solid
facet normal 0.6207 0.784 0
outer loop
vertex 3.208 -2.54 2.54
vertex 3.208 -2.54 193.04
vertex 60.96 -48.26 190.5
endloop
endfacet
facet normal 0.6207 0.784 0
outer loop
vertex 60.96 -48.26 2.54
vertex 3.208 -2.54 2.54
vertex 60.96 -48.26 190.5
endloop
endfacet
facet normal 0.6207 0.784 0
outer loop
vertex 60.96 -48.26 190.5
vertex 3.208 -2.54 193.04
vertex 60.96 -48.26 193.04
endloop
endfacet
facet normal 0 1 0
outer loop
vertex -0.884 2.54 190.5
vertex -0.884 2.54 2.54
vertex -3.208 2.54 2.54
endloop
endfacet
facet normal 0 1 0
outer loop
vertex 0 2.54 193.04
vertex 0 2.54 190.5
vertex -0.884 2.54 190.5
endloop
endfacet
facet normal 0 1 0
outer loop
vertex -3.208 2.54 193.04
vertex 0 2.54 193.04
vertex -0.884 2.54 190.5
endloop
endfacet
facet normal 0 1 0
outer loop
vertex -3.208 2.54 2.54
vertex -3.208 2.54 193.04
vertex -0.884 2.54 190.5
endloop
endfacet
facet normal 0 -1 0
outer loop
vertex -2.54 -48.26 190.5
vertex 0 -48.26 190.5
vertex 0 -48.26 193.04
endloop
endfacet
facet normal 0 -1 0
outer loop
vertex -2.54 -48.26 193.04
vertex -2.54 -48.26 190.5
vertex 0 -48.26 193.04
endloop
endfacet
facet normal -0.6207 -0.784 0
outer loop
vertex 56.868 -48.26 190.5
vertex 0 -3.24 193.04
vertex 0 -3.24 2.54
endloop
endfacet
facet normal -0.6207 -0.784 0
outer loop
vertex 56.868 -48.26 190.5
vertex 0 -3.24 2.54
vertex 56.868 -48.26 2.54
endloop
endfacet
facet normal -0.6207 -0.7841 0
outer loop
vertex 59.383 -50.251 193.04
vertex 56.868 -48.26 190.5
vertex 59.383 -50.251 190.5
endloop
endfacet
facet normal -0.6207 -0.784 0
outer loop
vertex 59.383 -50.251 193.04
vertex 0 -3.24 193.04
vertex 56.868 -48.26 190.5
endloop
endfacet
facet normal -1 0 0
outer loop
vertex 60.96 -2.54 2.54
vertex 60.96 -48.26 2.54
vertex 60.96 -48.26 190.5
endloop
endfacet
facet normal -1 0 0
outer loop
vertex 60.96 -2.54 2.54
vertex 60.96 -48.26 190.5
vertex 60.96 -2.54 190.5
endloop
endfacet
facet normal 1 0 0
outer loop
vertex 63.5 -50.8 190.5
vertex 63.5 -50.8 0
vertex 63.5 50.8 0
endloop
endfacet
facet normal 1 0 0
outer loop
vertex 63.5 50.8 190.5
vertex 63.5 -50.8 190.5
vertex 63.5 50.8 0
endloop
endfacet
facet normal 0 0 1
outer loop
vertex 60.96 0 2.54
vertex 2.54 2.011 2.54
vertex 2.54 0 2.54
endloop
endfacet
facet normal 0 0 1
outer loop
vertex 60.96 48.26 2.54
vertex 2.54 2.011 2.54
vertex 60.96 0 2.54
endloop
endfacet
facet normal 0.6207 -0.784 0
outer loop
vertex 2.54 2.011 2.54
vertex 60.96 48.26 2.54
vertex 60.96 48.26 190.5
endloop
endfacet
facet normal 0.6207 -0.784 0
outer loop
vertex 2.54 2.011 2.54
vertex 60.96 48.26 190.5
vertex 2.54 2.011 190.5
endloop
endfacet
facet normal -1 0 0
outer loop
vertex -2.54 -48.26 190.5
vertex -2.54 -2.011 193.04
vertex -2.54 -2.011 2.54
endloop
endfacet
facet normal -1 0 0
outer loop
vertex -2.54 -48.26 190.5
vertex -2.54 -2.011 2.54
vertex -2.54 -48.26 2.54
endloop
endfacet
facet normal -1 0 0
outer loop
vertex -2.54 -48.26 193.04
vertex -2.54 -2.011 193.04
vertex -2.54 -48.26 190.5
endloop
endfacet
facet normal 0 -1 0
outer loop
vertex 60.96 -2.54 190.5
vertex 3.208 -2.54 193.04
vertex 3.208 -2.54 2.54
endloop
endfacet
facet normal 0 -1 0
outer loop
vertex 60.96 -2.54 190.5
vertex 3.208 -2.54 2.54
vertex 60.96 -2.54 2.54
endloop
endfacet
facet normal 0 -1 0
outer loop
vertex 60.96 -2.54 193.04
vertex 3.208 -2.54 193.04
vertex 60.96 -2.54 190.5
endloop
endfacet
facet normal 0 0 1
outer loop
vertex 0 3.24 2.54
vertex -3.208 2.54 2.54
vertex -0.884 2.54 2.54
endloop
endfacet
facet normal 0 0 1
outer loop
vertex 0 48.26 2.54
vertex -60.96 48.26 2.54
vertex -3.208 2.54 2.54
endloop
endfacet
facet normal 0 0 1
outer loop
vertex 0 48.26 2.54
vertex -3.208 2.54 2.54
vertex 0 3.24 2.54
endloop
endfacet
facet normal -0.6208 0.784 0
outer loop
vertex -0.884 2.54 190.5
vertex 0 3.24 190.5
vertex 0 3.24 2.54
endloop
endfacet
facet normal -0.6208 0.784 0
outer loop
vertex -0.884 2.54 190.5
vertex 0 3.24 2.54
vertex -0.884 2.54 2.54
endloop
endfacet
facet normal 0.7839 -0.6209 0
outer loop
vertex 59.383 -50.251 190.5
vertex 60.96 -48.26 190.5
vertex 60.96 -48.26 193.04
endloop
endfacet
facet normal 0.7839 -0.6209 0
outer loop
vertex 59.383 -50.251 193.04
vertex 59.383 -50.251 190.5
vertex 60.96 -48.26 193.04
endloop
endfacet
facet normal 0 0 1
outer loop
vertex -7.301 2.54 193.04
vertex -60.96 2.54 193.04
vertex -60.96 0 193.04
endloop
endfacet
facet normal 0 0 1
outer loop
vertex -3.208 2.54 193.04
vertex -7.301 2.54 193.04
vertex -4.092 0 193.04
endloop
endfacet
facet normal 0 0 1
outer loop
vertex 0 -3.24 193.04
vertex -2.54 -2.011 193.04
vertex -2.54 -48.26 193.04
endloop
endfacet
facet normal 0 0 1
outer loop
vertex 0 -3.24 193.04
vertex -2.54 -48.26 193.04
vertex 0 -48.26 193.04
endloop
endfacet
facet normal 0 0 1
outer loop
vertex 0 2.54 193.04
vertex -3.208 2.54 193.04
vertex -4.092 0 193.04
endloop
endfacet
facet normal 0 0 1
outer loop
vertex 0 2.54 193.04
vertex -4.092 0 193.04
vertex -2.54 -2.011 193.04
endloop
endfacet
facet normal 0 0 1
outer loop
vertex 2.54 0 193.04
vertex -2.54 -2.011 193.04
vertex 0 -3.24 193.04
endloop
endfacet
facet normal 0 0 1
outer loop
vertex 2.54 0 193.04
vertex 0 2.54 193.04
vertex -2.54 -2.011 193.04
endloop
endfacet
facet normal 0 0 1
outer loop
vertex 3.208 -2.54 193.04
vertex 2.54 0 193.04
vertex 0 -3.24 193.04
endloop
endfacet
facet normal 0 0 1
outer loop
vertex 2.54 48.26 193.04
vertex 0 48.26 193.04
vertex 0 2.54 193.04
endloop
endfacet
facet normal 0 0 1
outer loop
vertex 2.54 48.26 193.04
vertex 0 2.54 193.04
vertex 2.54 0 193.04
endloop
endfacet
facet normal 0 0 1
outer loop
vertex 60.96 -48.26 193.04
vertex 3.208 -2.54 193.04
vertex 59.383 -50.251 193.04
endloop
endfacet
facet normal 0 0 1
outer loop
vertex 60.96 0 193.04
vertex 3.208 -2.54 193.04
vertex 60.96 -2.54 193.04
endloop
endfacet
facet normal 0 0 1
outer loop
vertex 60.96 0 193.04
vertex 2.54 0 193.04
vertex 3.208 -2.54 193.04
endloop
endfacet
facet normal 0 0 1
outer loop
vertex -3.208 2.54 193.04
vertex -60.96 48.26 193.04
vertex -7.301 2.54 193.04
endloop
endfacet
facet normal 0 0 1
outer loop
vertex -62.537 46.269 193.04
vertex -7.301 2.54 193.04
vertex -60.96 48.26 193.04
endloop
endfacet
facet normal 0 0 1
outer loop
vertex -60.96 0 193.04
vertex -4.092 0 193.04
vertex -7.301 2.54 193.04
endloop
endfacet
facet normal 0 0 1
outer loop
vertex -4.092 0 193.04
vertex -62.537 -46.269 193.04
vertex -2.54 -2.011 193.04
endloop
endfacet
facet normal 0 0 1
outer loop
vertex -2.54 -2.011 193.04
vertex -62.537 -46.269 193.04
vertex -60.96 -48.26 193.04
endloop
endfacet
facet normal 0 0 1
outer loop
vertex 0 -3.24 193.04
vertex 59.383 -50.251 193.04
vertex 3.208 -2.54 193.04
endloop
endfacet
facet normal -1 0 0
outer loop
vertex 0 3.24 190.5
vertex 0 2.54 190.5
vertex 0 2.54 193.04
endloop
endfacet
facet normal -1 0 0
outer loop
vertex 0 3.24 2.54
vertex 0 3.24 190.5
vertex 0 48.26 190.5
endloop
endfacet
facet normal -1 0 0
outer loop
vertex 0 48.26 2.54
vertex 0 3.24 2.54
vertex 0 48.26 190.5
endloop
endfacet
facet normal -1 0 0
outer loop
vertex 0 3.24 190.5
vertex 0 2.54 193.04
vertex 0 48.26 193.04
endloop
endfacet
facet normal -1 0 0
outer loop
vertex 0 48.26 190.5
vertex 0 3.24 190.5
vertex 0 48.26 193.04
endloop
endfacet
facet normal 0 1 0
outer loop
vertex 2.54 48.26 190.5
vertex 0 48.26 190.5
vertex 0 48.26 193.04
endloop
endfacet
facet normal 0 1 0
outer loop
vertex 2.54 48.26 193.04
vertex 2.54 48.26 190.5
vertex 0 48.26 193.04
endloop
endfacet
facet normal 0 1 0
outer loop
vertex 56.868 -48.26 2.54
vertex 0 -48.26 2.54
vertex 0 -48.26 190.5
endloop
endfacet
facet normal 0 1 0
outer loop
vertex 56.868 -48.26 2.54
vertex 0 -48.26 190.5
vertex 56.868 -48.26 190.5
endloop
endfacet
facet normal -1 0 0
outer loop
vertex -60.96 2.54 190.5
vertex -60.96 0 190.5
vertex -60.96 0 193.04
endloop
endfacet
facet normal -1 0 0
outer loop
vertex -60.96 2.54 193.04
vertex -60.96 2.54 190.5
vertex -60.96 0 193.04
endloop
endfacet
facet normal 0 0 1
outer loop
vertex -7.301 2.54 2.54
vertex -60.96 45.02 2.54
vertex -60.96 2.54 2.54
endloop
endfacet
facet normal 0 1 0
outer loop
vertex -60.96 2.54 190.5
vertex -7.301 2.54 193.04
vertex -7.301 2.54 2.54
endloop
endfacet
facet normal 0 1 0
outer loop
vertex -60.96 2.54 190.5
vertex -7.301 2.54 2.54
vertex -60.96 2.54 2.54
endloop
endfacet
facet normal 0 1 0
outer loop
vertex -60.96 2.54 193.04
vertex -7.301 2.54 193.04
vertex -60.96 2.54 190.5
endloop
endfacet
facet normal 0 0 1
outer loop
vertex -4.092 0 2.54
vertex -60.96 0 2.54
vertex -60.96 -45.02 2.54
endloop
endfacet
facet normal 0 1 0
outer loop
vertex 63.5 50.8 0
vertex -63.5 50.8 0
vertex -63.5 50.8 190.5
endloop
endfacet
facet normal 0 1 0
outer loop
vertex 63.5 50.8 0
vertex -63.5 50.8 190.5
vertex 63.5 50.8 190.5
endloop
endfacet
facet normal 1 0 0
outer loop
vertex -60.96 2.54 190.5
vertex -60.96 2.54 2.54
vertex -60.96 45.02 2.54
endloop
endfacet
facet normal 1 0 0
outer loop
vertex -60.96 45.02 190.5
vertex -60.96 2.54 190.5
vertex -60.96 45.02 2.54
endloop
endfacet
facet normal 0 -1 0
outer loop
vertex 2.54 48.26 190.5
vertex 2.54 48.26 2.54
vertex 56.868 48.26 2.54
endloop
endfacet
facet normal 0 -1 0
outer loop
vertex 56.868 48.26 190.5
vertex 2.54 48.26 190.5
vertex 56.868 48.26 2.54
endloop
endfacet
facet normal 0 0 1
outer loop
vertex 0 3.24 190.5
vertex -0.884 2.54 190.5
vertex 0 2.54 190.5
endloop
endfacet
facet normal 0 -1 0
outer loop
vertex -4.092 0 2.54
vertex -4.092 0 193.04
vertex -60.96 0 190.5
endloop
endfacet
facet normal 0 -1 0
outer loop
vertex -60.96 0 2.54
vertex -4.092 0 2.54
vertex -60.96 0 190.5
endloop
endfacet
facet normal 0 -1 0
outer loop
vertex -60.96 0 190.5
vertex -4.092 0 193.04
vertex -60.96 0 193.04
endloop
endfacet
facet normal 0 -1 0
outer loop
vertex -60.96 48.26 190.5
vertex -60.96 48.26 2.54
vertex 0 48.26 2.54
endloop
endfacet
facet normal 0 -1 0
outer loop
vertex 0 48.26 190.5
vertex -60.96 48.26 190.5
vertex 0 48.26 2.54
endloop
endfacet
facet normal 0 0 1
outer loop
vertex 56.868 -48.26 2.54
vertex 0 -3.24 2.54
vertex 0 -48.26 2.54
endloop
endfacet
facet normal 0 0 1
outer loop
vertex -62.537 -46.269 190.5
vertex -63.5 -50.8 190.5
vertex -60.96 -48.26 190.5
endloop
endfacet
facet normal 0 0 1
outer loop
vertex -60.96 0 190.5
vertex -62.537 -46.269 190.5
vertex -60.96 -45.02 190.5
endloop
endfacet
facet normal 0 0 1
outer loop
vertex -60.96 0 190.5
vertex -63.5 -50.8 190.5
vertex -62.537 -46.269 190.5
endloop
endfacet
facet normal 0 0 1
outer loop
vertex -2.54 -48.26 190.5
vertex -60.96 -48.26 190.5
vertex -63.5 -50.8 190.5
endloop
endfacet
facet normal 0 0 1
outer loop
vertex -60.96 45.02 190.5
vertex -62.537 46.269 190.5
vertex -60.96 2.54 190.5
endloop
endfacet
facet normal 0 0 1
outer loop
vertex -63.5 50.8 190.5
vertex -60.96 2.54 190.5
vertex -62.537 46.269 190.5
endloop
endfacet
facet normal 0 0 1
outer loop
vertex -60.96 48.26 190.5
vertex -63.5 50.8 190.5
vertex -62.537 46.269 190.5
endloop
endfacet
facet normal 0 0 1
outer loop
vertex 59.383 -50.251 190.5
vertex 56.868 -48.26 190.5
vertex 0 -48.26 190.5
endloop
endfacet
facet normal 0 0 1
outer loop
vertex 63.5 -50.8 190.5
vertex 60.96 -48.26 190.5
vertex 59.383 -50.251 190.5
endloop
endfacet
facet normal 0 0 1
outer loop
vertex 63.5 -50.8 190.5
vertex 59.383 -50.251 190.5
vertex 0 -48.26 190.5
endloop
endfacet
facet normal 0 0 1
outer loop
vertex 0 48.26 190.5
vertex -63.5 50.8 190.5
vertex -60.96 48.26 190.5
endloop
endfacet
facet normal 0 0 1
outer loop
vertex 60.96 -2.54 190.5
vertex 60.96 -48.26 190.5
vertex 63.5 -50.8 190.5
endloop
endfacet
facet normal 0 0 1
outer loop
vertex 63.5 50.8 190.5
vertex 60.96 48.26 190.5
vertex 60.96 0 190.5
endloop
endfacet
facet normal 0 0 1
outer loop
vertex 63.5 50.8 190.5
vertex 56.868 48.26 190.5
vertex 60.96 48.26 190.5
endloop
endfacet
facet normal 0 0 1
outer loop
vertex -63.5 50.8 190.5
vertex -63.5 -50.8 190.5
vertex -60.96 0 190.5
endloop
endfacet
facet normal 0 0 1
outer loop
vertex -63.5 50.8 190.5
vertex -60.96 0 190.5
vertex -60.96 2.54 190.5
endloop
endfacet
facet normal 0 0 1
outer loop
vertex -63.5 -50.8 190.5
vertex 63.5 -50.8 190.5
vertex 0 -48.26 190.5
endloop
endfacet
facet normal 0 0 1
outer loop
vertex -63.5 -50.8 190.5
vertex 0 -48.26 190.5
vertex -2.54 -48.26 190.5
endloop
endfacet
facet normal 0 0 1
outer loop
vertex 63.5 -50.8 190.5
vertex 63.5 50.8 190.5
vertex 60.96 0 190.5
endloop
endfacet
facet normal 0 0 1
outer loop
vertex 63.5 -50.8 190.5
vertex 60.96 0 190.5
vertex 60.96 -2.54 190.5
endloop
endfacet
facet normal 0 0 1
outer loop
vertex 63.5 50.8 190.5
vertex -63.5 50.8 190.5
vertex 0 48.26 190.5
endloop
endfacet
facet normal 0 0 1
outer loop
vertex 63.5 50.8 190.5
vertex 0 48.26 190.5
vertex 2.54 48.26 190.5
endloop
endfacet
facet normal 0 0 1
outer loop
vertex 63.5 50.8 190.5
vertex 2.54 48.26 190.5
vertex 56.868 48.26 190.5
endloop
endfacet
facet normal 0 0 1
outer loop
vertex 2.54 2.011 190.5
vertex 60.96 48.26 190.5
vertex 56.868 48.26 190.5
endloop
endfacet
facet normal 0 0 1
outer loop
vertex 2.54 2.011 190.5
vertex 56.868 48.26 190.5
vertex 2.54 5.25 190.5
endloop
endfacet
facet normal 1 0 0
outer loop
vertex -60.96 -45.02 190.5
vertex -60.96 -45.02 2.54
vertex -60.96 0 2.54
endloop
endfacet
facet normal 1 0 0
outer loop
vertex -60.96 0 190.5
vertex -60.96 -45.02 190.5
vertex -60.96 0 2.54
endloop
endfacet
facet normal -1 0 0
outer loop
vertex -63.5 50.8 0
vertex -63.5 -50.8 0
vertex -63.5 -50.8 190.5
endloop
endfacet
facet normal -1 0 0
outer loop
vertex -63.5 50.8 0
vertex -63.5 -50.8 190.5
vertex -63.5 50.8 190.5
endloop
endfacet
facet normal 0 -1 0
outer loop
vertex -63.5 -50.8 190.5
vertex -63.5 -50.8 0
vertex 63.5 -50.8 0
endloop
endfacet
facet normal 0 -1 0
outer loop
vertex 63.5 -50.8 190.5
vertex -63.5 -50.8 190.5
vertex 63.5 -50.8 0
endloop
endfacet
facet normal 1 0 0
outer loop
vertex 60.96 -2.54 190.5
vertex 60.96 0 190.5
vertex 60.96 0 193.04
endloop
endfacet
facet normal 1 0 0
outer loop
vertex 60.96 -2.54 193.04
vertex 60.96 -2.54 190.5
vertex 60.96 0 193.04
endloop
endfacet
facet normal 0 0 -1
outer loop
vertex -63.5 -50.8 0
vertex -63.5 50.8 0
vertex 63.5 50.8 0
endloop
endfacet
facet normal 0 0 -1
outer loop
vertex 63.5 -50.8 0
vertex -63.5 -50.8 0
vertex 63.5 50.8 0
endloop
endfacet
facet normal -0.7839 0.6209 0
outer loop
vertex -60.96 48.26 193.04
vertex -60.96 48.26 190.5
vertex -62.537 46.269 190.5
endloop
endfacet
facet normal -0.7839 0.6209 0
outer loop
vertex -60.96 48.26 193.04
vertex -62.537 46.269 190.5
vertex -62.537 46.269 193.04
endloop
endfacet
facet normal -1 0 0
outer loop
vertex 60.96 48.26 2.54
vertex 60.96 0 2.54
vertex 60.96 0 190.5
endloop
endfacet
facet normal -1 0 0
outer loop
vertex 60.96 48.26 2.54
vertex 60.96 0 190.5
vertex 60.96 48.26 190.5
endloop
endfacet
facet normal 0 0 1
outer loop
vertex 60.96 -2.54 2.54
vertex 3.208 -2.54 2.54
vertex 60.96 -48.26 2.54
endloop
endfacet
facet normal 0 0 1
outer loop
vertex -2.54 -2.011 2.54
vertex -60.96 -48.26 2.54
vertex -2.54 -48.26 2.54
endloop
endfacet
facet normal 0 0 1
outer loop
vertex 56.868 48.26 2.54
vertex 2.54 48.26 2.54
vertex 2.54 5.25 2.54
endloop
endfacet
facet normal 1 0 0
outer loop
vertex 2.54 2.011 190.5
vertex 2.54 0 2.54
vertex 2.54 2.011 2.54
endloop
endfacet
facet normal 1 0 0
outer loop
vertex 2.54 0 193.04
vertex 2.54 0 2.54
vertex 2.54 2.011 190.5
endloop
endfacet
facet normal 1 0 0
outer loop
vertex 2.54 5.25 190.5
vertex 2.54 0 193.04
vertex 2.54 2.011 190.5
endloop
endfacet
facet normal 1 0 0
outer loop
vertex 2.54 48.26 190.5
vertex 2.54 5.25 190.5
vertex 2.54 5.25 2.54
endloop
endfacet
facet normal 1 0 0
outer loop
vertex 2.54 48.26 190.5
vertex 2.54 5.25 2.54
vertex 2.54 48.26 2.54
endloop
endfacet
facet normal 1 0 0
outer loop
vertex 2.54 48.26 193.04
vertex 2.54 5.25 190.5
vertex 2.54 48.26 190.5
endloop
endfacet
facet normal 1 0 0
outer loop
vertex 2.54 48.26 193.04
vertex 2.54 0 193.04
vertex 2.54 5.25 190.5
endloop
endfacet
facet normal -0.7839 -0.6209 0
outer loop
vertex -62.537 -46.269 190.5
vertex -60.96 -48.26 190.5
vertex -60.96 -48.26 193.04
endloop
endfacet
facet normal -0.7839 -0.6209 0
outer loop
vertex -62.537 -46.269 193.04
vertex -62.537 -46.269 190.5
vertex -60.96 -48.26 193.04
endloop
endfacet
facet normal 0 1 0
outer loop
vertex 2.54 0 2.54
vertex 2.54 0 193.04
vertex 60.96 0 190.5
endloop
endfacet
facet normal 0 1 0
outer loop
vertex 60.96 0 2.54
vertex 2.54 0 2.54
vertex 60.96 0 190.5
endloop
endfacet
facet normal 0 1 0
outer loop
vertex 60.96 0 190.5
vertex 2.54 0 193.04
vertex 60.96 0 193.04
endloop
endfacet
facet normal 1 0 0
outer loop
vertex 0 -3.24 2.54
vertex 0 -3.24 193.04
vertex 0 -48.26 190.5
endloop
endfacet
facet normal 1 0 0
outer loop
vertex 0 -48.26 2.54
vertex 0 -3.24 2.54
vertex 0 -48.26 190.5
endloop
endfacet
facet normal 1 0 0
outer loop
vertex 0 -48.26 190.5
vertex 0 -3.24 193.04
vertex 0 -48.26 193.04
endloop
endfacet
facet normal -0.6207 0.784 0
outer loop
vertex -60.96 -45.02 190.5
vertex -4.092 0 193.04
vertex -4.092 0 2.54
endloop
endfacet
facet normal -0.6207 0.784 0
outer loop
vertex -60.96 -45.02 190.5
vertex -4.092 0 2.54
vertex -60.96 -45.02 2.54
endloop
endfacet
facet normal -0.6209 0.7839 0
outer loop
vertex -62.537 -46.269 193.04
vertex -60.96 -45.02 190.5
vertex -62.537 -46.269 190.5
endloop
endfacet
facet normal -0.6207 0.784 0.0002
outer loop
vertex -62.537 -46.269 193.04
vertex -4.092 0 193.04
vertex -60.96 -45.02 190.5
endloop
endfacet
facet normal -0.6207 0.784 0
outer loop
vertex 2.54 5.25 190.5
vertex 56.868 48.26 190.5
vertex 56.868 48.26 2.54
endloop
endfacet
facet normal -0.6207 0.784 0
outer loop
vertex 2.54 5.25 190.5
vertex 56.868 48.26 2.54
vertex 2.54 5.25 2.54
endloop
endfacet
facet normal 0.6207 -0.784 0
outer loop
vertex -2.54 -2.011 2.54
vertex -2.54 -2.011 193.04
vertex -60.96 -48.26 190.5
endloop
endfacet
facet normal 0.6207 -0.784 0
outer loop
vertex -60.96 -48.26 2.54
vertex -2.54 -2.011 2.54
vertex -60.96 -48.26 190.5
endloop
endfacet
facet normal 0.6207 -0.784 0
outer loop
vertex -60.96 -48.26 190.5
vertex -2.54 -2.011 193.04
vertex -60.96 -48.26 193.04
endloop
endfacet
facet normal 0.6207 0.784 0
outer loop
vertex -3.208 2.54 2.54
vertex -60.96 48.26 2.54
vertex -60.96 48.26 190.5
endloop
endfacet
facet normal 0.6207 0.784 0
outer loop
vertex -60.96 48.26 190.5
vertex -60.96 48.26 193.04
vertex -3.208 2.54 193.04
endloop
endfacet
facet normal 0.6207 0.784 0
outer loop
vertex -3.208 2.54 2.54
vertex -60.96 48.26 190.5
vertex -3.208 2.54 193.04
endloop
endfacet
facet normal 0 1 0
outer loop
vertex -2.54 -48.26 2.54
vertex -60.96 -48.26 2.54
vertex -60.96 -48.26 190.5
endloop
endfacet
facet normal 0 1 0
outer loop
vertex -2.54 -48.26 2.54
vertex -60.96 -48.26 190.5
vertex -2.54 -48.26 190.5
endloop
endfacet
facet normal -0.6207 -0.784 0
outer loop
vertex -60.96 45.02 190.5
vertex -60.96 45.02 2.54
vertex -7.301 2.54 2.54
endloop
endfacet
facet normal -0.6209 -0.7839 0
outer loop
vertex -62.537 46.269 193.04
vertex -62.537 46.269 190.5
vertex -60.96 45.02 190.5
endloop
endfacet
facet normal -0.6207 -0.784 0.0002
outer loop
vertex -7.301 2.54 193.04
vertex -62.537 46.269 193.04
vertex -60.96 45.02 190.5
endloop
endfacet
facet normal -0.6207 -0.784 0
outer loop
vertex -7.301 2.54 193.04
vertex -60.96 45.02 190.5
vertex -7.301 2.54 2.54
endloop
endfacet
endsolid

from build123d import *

# Parameters (mm, degrees)
F0_W      = 127
F0_H      = 101.6
F1_DEPTH  = 190.5
F2_T      = -2.54
F10_E18_W = 60.96
F10_E18_H = 190.5
F19_DEPTH = 2.54
F12_E19_W = 77.7505575543
F12_E19_H = 190.5
F20_DEPTH = 2.54
F14_E20_W = 48.26
F14_E20_H = 190.5
F21_DEPTH = 2.54
F16_E21_W = 77.7505575543
F16_E21_H = 190.5
F22_DEPTH = 2.54
F18_E22_W = 60.96
F18_E22_H = 190.5
F23_DEPTH = 2.54
F4_E9_W   = 77.7505575543
F4_E9_H   = 187.96
F24_DEPTH = 2.54
F6_E16_W  = 48.26
F6_E16_H  = 190.5
F25_DEPTH = 2.54
F8_E17_W  = 77.7505575543
F8_E17_H  = 190.5
F26_DEPTH = 2.54


with BuildPart() as f1:
    # F0 (on Top) → F1 (new body)
    with BuildSketch(Plane.XY):
        Rectangle(F0_W, F0_H)
    extrude(amount=F1_DEPTH)

    # F2
    f2_openings = [f1.faces().sort_by_distance(p)[0] for p in [
        (0, 0, 190.5),
    ]]
    offset(amount=F2_T, openings=f2_openings)

    # F10_E18 (on explicit) → F19 (join)
    with BuildSketch(Plane(origin=(0, 0, 2.54), x_dir=(-1, 0, 0), z_dir=(0, 1, 0))):
        with Locations((30.48, 95.25)):
            Rectangle(F10_E18_W, F10_E18_H)
    extrude(amount=F19_DEPTH)

    # F12_E19 (on explicit) → F20 (join)
    with BuildSketch(Plane(origin=(0, 0, 2.54), x_dir=(-0.7840458245, -0.6207029444, 0), z_dir=(-0.6207029444, 0.7840458245, 0))):
        with Locations((38.8752787771, 95.25)):
            Rectangle(F12_E19_W, F12_E19_H)
    extrude(amount=F20_DEPTH)

    # F14_E20 (on explicit) → F21 (join)
    with BuildSketch(Plane(origin=(0, 0, 2.54), x_dir=(0, -1, 0), z_dir=(-1, 0, 0))):
        with Locations((24.13, 95.25)):
            Rectangle(F14_E20_W, F14_E20_H)
    extrude(amount=F21_DEPTH)

    # F16_E21 (on explicit) → F22 (join)
    with BuildSketch(Plane(origin=(0, 0, 2.54), x_dir=(0.7840458245, -0.6207029444, 0), z_dir=(-0.6207029444, -0.7840458245, 0))):
        with Locations((38.8752787771, 95.25)):
            Rectangle(F16_E21_W, F16_E21_H)
    extrude(amount=F22_DEPTH)

    # F18_E22 (on explicit) → F23 (join)
    with BuildSketch(Plane(origin=(0, 0, 2.54), x_dir=(1, 0, 0), z_dir=(0, -1, 0))):
        with Locations((30.48, 95.25)):
            Rectangle(F18_E22_W, F18_E22_H)
    extrude(amount=F23_DEPTH)

    # F4_E9 (on explicit) → F24 (join)
    with BuildSketch(Plane(origin=(60.96, 48.26, 2.54), x_dir=(-0.7840458245, -0.6207029444, 0), z_dir=(-0.6207029444, 0.7840458245, 0))):
        with Locations((38.8752787771, 93.98)):
            Rectangle(F4_E9_W, F4_E9_H)
    extrude(amount=F24_DEPTH)

    # F6_E16 (on explicit) → F25 (join)
    with BuildSketch(Plane(origin=(0, 0, 2.54), x_dir=(0, 1, 0), z_dir=(1, 0, 0))):
        with Locations((24.13, 95.25)):
            Rectangle(F6_E16_W, F6_E16_H)
    extrude(amount=F25_DEPTH)

    # F8_E17 (on explicit) → F26 (join)
    with BuildSketch(Plane(origin=(-60.96, 48.26, 2.54), x_dir=(0.7840458245, -0.6207029444, 0), z_dir=(-0.6207029444, -0.7840458245, 0))):
        with Locations((38.8752787771, 95.25)):
            Rectangle(F8_E17_W, F8_E17_H)
    extrude(amount=F26_DEPTH)


solid = f1.part
